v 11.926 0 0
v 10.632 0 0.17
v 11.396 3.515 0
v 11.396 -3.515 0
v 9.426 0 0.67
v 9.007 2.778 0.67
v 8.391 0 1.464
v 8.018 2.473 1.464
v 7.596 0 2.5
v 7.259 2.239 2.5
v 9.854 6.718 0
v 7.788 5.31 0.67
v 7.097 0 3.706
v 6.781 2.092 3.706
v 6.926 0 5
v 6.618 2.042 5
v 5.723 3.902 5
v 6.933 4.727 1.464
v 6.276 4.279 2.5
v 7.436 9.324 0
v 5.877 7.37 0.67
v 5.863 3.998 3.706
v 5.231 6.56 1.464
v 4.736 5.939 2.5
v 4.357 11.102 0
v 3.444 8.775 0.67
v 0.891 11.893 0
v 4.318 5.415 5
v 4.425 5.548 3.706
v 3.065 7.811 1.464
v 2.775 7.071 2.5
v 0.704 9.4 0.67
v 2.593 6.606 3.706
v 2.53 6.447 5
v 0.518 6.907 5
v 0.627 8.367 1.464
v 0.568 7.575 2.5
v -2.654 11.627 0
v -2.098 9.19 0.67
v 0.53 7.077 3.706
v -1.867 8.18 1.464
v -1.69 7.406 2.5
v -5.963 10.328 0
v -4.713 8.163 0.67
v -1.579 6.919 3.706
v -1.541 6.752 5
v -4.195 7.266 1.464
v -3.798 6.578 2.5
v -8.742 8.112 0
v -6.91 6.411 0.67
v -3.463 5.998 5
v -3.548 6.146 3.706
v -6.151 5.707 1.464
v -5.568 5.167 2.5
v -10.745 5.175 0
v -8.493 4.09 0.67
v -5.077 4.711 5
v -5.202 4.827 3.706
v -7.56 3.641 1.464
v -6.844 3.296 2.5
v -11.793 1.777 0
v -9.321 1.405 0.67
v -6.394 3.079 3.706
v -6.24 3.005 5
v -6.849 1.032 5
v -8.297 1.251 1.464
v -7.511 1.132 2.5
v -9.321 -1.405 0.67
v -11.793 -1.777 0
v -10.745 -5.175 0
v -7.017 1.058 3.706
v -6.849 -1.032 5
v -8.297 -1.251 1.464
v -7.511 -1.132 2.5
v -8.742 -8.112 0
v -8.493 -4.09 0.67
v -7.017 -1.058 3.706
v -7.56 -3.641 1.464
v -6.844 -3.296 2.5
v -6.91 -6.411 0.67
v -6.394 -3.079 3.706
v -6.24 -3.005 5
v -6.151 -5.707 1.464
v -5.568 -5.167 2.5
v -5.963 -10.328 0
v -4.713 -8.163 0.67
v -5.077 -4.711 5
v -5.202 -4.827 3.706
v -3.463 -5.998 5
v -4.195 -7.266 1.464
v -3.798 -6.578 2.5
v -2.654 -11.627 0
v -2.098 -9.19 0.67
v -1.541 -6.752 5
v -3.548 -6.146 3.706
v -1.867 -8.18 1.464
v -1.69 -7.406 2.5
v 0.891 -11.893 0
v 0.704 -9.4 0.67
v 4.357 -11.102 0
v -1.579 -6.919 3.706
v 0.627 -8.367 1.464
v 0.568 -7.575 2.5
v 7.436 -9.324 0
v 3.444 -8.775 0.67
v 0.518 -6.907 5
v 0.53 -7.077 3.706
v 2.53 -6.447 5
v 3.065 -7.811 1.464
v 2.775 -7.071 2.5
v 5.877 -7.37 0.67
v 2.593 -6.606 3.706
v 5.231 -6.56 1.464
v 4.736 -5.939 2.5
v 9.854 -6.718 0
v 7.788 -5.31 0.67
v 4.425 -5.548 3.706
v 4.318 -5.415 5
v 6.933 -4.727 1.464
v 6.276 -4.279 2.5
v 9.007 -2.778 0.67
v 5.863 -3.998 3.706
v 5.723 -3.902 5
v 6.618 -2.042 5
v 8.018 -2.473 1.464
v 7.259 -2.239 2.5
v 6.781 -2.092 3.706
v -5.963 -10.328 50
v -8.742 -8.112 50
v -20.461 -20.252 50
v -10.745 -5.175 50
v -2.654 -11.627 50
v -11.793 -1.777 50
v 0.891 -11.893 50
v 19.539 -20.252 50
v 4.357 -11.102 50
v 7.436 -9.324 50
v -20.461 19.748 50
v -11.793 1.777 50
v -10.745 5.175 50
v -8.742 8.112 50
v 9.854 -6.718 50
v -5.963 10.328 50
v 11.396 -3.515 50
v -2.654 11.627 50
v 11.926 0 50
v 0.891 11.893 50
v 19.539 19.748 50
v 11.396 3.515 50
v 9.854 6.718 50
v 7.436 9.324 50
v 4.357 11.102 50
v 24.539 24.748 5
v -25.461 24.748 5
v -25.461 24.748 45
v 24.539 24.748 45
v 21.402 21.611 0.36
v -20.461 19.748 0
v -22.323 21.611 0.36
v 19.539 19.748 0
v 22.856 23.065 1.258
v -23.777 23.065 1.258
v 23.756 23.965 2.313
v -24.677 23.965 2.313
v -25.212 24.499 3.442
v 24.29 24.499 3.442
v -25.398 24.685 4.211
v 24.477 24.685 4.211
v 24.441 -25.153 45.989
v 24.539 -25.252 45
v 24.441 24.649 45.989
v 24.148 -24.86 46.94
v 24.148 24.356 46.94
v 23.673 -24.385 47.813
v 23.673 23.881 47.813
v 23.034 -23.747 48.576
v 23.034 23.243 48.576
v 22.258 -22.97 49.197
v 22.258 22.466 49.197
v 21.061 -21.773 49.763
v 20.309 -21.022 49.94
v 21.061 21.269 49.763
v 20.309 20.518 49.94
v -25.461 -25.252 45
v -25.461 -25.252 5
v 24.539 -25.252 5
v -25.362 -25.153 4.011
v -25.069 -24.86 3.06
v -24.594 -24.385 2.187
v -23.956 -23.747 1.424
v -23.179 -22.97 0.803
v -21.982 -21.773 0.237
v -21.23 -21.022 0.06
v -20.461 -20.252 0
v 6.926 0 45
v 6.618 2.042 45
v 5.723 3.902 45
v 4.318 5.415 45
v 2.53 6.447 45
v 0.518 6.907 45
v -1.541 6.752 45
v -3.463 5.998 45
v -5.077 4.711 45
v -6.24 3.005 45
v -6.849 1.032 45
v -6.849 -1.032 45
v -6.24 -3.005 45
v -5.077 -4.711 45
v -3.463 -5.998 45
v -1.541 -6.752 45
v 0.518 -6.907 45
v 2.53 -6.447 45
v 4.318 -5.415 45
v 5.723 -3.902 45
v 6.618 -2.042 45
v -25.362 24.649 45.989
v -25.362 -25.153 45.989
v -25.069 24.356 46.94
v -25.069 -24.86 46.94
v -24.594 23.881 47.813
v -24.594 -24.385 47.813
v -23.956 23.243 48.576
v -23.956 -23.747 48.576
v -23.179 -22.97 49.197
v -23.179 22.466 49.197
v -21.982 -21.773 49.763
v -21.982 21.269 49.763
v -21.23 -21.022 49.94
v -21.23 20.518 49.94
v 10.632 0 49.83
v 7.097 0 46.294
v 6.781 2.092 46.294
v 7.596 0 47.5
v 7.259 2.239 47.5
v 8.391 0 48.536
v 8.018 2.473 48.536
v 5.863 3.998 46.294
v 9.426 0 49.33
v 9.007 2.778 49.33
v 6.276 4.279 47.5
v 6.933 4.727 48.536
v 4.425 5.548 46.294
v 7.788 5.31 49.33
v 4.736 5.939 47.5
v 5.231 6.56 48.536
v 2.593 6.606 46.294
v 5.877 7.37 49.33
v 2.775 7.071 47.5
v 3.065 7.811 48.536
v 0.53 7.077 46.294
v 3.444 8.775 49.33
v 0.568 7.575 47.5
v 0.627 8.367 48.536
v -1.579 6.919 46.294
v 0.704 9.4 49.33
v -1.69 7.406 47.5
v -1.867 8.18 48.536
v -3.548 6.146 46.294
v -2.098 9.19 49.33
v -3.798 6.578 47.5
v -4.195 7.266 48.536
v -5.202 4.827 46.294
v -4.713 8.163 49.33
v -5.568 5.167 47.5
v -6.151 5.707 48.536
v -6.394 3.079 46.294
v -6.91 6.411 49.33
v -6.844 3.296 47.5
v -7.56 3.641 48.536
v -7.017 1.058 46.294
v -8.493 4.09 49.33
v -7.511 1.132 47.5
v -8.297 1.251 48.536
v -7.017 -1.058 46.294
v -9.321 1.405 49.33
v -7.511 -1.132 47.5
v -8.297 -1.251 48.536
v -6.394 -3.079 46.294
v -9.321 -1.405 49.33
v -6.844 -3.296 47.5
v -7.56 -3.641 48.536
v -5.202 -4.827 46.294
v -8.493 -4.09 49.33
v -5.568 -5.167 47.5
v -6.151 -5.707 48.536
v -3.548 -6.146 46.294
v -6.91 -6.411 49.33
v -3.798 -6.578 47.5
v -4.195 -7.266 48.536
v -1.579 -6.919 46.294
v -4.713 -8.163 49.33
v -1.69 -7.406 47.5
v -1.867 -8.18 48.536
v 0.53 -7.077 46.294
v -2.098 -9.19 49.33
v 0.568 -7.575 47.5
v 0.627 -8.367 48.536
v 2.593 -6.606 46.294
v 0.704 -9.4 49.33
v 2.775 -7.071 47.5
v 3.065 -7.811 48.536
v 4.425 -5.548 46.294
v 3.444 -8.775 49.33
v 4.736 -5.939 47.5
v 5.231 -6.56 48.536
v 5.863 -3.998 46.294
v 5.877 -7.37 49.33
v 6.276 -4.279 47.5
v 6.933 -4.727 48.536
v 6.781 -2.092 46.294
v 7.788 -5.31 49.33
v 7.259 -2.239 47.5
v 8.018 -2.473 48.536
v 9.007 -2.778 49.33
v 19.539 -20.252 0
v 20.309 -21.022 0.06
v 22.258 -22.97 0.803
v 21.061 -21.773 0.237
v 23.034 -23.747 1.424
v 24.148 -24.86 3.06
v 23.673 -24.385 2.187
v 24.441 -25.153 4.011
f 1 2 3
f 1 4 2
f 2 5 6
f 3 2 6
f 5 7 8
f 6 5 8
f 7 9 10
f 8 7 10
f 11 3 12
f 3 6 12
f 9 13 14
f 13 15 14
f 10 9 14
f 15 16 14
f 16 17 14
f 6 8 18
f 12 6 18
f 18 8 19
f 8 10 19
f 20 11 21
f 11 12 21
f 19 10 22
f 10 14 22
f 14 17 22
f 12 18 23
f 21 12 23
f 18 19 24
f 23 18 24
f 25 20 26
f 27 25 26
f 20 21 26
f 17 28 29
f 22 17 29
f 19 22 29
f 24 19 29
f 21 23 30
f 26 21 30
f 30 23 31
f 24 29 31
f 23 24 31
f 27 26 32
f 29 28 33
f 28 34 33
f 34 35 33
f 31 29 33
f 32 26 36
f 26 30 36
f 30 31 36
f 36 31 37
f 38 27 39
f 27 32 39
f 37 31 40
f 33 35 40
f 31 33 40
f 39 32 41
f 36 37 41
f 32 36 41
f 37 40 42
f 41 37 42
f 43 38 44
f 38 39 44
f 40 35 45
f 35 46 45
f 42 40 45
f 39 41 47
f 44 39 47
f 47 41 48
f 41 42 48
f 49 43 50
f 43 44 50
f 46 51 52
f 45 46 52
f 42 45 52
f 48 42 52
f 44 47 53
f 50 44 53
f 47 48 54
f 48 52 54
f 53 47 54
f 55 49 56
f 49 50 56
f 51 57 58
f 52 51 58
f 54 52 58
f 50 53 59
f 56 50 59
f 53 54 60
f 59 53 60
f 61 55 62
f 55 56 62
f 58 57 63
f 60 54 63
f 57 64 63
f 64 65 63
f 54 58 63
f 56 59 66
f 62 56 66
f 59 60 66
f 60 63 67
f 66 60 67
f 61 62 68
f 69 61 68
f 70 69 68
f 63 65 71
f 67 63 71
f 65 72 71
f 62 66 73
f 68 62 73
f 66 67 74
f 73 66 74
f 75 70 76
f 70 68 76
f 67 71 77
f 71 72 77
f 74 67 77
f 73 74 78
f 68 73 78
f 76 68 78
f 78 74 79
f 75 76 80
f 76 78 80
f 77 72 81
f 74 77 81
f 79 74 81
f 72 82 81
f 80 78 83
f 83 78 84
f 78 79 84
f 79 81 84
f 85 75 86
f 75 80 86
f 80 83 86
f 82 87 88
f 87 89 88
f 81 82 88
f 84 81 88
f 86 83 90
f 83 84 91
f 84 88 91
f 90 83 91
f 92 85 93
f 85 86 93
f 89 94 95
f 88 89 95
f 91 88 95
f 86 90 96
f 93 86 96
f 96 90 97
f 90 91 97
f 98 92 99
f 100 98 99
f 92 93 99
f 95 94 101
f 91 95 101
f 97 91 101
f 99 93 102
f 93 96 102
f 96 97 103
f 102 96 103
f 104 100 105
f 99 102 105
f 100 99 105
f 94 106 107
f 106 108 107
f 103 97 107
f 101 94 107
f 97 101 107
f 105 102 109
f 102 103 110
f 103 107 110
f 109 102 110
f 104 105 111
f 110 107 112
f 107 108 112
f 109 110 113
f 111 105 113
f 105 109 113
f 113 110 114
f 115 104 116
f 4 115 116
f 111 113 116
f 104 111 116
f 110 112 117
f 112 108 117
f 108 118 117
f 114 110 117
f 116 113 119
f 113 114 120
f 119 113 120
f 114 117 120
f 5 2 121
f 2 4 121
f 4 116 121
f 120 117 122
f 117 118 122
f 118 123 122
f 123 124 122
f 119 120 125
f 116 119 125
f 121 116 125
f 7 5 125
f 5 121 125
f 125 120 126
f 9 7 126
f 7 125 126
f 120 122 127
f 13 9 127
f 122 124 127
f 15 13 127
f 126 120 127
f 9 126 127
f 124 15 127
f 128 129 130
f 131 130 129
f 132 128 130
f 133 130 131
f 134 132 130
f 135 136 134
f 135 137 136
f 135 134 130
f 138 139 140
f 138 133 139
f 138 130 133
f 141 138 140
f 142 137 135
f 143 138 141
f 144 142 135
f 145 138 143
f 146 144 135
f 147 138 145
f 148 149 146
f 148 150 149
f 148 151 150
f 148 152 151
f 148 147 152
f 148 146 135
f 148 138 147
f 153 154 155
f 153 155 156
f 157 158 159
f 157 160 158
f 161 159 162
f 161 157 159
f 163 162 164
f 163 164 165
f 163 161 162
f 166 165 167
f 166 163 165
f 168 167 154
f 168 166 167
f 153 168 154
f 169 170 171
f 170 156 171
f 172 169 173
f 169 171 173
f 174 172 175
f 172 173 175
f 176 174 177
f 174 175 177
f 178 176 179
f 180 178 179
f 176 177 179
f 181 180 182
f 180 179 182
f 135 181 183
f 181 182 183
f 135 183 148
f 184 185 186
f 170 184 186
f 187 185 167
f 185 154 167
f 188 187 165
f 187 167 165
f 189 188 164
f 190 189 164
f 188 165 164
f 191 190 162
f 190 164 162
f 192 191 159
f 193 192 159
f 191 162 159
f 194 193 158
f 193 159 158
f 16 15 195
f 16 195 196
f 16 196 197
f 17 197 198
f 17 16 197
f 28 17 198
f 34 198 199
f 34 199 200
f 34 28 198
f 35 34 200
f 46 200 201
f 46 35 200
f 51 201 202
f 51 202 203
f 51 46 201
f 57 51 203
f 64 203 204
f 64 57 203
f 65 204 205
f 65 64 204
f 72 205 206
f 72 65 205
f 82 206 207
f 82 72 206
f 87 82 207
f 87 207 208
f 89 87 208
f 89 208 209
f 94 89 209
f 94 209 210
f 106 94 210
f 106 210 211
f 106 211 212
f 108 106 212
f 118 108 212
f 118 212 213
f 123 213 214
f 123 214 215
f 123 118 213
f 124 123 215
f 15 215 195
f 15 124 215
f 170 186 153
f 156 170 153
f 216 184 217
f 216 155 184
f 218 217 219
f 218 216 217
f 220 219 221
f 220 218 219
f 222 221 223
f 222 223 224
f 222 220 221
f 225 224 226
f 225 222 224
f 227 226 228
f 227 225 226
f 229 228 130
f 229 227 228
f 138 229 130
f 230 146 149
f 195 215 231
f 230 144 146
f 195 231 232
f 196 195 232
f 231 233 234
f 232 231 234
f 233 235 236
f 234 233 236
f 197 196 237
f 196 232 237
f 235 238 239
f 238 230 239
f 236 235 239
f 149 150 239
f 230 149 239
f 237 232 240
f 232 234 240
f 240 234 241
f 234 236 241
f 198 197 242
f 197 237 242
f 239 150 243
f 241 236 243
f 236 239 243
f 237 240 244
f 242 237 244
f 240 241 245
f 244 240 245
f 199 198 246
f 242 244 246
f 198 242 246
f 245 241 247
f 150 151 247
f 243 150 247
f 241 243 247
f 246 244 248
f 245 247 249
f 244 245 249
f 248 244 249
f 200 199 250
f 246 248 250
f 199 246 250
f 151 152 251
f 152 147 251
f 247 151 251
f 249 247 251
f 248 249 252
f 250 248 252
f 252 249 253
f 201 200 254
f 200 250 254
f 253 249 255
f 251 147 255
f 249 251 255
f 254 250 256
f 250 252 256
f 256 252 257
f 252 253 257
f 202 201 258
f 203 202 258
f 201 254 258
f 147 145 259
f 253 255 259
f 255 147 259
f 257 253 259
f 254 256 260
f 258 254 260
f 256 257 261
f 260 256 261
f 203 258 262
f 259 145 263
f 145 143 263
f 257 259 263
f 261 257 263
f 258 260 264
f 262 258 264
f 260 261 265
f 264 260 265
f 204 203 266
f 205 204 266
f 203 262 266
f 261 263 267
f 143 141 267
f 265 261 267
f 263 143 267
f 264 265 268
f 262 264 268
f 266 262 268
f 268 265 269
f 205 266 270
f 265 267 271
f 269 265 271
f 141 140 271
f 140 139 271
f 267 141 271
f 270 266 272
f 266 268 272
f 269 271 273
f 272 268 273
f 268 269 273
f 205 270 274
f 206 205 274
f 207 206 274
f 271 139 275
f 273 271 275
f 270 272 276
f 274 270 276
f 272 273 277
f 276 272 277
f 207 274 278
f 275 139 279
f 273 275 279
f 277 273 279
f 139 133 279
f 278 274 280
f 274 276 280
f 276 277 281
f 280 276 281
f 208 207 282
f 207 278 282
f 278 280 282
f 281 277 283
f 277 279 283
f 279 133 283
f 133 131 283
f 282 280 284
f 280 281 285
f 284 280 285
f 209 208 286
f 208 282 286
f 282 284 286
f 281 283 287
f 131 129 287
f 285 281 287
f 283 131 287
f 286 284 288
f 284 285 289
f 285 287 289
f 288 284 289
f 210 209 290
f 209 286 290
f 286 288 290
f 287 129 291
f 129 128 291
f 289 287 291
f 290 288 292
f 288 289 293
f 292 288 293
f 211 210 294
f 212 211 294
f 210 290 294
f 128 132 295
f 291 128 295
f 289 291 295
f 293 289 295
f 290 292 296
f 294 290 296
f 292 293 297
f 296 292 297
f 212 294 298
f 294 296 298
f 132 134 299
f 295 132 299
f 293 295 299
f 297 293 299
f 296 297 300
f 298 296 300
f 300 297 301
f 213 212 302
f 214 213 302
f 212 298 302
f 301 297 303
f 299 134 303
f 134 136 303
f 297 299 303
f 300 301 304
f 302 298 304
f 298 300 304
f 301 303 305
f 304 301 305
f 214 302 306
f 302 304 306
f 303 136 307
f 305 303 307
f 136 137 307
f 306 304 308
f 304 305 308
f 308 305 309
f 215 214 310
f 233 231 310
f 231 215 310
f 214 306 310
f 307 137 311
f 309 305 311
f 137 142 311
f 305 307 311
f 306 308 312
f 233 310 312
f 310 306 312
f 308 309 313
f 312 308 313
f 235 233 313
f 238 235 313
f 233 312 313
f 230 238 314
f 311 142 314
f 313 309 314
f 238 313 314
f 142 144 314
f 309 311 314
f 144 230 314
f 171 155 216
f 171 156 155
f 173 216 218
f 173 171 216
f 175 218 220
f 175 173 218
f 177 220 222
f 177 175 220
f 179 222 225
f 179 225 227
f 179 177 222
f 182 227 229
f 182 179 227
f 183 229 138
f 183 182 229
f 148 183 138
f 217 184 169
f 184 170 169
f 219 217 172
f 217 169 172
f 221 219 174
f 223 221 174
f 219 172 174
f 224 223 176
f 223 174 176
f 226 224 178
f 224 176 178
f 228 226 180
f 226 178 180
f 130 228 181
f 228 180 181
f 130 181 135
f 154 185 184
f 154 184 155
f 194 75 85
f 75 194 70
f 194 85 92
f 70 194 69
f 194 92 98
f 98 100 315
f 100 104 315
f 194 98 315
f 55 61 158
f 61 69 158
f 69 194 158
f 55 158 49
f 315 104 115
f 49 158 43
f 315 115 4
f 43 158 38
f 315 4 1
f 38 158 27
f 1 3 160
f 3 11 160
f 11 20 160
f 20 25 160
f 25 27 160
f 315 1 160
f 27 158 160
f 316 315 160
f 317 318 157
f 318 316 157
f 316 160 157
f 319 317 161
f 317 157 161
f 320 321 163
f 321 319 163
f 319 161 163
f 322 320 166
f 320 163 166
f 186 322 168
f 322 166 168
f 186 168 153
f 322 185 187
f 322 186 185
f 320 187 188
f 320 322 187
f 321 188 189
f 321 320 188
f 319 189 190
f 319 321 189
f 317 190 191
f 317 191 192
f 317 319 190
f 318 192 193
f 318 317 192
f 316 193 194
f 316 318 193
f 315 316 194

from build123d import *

# Parameters (mm, degrees)
F0_W     = 50
F0_H     = 50
F0_R     = 6.92614
F1_DEPTH = 50
F2_DEPTH = 20
F3_R     = 5
F4_R     = 5


with BuildPart() as f1:
    # F0 (on Top) → F1 (new body)
    with BuildSketch(Plane.XY):
        with Locations((-0.460617, -0.251955)):
            Rectangle(F0_W, F0_H)
        Circle(F0_R, mode=Mode.SUBTRACT)
    extrude(amount=F1_DEPTH)

    # F0 (on Top) → F2 (cut)
    with BuildSketch(Plane.XY):
        with Locations((-0.460617, -0.251955)):
            Rectangle(F0_W, F0_H)
        Circle(F0_R, mode=Mode.SUBTRACT)
    extrude(amount=-F2_DEPTH, mode=Mode.SUBTRACT)

    # F3
    f3_edges = [f1.edges().sort_by_distance(p)[0] for p in [
        (-0.460617, 24.748045, 50),
        (-25.460617, -0.251955, 50),
        (-0.460617, -25.251955, 50),
        (24.539383, -0.251955, 50),
        (-6.92614, 0, 50),
    ]]
    fillet(f3_edges, radius=F3_R)

    # F4
    f4_edges = [f1.edges().sort_by_distance(p)[0] for p in [
        (-0.460617, 24.748045, 0),
        (-25.460617, -0.251955, 0),
        (-0.460617, -25.251955, 0),
        (24.539383, -0.251955, 0),
        (-6.92614, 0, 0),
    ]]
    fillet(f4_edges, radius=F4_R)


solid = f1.part
